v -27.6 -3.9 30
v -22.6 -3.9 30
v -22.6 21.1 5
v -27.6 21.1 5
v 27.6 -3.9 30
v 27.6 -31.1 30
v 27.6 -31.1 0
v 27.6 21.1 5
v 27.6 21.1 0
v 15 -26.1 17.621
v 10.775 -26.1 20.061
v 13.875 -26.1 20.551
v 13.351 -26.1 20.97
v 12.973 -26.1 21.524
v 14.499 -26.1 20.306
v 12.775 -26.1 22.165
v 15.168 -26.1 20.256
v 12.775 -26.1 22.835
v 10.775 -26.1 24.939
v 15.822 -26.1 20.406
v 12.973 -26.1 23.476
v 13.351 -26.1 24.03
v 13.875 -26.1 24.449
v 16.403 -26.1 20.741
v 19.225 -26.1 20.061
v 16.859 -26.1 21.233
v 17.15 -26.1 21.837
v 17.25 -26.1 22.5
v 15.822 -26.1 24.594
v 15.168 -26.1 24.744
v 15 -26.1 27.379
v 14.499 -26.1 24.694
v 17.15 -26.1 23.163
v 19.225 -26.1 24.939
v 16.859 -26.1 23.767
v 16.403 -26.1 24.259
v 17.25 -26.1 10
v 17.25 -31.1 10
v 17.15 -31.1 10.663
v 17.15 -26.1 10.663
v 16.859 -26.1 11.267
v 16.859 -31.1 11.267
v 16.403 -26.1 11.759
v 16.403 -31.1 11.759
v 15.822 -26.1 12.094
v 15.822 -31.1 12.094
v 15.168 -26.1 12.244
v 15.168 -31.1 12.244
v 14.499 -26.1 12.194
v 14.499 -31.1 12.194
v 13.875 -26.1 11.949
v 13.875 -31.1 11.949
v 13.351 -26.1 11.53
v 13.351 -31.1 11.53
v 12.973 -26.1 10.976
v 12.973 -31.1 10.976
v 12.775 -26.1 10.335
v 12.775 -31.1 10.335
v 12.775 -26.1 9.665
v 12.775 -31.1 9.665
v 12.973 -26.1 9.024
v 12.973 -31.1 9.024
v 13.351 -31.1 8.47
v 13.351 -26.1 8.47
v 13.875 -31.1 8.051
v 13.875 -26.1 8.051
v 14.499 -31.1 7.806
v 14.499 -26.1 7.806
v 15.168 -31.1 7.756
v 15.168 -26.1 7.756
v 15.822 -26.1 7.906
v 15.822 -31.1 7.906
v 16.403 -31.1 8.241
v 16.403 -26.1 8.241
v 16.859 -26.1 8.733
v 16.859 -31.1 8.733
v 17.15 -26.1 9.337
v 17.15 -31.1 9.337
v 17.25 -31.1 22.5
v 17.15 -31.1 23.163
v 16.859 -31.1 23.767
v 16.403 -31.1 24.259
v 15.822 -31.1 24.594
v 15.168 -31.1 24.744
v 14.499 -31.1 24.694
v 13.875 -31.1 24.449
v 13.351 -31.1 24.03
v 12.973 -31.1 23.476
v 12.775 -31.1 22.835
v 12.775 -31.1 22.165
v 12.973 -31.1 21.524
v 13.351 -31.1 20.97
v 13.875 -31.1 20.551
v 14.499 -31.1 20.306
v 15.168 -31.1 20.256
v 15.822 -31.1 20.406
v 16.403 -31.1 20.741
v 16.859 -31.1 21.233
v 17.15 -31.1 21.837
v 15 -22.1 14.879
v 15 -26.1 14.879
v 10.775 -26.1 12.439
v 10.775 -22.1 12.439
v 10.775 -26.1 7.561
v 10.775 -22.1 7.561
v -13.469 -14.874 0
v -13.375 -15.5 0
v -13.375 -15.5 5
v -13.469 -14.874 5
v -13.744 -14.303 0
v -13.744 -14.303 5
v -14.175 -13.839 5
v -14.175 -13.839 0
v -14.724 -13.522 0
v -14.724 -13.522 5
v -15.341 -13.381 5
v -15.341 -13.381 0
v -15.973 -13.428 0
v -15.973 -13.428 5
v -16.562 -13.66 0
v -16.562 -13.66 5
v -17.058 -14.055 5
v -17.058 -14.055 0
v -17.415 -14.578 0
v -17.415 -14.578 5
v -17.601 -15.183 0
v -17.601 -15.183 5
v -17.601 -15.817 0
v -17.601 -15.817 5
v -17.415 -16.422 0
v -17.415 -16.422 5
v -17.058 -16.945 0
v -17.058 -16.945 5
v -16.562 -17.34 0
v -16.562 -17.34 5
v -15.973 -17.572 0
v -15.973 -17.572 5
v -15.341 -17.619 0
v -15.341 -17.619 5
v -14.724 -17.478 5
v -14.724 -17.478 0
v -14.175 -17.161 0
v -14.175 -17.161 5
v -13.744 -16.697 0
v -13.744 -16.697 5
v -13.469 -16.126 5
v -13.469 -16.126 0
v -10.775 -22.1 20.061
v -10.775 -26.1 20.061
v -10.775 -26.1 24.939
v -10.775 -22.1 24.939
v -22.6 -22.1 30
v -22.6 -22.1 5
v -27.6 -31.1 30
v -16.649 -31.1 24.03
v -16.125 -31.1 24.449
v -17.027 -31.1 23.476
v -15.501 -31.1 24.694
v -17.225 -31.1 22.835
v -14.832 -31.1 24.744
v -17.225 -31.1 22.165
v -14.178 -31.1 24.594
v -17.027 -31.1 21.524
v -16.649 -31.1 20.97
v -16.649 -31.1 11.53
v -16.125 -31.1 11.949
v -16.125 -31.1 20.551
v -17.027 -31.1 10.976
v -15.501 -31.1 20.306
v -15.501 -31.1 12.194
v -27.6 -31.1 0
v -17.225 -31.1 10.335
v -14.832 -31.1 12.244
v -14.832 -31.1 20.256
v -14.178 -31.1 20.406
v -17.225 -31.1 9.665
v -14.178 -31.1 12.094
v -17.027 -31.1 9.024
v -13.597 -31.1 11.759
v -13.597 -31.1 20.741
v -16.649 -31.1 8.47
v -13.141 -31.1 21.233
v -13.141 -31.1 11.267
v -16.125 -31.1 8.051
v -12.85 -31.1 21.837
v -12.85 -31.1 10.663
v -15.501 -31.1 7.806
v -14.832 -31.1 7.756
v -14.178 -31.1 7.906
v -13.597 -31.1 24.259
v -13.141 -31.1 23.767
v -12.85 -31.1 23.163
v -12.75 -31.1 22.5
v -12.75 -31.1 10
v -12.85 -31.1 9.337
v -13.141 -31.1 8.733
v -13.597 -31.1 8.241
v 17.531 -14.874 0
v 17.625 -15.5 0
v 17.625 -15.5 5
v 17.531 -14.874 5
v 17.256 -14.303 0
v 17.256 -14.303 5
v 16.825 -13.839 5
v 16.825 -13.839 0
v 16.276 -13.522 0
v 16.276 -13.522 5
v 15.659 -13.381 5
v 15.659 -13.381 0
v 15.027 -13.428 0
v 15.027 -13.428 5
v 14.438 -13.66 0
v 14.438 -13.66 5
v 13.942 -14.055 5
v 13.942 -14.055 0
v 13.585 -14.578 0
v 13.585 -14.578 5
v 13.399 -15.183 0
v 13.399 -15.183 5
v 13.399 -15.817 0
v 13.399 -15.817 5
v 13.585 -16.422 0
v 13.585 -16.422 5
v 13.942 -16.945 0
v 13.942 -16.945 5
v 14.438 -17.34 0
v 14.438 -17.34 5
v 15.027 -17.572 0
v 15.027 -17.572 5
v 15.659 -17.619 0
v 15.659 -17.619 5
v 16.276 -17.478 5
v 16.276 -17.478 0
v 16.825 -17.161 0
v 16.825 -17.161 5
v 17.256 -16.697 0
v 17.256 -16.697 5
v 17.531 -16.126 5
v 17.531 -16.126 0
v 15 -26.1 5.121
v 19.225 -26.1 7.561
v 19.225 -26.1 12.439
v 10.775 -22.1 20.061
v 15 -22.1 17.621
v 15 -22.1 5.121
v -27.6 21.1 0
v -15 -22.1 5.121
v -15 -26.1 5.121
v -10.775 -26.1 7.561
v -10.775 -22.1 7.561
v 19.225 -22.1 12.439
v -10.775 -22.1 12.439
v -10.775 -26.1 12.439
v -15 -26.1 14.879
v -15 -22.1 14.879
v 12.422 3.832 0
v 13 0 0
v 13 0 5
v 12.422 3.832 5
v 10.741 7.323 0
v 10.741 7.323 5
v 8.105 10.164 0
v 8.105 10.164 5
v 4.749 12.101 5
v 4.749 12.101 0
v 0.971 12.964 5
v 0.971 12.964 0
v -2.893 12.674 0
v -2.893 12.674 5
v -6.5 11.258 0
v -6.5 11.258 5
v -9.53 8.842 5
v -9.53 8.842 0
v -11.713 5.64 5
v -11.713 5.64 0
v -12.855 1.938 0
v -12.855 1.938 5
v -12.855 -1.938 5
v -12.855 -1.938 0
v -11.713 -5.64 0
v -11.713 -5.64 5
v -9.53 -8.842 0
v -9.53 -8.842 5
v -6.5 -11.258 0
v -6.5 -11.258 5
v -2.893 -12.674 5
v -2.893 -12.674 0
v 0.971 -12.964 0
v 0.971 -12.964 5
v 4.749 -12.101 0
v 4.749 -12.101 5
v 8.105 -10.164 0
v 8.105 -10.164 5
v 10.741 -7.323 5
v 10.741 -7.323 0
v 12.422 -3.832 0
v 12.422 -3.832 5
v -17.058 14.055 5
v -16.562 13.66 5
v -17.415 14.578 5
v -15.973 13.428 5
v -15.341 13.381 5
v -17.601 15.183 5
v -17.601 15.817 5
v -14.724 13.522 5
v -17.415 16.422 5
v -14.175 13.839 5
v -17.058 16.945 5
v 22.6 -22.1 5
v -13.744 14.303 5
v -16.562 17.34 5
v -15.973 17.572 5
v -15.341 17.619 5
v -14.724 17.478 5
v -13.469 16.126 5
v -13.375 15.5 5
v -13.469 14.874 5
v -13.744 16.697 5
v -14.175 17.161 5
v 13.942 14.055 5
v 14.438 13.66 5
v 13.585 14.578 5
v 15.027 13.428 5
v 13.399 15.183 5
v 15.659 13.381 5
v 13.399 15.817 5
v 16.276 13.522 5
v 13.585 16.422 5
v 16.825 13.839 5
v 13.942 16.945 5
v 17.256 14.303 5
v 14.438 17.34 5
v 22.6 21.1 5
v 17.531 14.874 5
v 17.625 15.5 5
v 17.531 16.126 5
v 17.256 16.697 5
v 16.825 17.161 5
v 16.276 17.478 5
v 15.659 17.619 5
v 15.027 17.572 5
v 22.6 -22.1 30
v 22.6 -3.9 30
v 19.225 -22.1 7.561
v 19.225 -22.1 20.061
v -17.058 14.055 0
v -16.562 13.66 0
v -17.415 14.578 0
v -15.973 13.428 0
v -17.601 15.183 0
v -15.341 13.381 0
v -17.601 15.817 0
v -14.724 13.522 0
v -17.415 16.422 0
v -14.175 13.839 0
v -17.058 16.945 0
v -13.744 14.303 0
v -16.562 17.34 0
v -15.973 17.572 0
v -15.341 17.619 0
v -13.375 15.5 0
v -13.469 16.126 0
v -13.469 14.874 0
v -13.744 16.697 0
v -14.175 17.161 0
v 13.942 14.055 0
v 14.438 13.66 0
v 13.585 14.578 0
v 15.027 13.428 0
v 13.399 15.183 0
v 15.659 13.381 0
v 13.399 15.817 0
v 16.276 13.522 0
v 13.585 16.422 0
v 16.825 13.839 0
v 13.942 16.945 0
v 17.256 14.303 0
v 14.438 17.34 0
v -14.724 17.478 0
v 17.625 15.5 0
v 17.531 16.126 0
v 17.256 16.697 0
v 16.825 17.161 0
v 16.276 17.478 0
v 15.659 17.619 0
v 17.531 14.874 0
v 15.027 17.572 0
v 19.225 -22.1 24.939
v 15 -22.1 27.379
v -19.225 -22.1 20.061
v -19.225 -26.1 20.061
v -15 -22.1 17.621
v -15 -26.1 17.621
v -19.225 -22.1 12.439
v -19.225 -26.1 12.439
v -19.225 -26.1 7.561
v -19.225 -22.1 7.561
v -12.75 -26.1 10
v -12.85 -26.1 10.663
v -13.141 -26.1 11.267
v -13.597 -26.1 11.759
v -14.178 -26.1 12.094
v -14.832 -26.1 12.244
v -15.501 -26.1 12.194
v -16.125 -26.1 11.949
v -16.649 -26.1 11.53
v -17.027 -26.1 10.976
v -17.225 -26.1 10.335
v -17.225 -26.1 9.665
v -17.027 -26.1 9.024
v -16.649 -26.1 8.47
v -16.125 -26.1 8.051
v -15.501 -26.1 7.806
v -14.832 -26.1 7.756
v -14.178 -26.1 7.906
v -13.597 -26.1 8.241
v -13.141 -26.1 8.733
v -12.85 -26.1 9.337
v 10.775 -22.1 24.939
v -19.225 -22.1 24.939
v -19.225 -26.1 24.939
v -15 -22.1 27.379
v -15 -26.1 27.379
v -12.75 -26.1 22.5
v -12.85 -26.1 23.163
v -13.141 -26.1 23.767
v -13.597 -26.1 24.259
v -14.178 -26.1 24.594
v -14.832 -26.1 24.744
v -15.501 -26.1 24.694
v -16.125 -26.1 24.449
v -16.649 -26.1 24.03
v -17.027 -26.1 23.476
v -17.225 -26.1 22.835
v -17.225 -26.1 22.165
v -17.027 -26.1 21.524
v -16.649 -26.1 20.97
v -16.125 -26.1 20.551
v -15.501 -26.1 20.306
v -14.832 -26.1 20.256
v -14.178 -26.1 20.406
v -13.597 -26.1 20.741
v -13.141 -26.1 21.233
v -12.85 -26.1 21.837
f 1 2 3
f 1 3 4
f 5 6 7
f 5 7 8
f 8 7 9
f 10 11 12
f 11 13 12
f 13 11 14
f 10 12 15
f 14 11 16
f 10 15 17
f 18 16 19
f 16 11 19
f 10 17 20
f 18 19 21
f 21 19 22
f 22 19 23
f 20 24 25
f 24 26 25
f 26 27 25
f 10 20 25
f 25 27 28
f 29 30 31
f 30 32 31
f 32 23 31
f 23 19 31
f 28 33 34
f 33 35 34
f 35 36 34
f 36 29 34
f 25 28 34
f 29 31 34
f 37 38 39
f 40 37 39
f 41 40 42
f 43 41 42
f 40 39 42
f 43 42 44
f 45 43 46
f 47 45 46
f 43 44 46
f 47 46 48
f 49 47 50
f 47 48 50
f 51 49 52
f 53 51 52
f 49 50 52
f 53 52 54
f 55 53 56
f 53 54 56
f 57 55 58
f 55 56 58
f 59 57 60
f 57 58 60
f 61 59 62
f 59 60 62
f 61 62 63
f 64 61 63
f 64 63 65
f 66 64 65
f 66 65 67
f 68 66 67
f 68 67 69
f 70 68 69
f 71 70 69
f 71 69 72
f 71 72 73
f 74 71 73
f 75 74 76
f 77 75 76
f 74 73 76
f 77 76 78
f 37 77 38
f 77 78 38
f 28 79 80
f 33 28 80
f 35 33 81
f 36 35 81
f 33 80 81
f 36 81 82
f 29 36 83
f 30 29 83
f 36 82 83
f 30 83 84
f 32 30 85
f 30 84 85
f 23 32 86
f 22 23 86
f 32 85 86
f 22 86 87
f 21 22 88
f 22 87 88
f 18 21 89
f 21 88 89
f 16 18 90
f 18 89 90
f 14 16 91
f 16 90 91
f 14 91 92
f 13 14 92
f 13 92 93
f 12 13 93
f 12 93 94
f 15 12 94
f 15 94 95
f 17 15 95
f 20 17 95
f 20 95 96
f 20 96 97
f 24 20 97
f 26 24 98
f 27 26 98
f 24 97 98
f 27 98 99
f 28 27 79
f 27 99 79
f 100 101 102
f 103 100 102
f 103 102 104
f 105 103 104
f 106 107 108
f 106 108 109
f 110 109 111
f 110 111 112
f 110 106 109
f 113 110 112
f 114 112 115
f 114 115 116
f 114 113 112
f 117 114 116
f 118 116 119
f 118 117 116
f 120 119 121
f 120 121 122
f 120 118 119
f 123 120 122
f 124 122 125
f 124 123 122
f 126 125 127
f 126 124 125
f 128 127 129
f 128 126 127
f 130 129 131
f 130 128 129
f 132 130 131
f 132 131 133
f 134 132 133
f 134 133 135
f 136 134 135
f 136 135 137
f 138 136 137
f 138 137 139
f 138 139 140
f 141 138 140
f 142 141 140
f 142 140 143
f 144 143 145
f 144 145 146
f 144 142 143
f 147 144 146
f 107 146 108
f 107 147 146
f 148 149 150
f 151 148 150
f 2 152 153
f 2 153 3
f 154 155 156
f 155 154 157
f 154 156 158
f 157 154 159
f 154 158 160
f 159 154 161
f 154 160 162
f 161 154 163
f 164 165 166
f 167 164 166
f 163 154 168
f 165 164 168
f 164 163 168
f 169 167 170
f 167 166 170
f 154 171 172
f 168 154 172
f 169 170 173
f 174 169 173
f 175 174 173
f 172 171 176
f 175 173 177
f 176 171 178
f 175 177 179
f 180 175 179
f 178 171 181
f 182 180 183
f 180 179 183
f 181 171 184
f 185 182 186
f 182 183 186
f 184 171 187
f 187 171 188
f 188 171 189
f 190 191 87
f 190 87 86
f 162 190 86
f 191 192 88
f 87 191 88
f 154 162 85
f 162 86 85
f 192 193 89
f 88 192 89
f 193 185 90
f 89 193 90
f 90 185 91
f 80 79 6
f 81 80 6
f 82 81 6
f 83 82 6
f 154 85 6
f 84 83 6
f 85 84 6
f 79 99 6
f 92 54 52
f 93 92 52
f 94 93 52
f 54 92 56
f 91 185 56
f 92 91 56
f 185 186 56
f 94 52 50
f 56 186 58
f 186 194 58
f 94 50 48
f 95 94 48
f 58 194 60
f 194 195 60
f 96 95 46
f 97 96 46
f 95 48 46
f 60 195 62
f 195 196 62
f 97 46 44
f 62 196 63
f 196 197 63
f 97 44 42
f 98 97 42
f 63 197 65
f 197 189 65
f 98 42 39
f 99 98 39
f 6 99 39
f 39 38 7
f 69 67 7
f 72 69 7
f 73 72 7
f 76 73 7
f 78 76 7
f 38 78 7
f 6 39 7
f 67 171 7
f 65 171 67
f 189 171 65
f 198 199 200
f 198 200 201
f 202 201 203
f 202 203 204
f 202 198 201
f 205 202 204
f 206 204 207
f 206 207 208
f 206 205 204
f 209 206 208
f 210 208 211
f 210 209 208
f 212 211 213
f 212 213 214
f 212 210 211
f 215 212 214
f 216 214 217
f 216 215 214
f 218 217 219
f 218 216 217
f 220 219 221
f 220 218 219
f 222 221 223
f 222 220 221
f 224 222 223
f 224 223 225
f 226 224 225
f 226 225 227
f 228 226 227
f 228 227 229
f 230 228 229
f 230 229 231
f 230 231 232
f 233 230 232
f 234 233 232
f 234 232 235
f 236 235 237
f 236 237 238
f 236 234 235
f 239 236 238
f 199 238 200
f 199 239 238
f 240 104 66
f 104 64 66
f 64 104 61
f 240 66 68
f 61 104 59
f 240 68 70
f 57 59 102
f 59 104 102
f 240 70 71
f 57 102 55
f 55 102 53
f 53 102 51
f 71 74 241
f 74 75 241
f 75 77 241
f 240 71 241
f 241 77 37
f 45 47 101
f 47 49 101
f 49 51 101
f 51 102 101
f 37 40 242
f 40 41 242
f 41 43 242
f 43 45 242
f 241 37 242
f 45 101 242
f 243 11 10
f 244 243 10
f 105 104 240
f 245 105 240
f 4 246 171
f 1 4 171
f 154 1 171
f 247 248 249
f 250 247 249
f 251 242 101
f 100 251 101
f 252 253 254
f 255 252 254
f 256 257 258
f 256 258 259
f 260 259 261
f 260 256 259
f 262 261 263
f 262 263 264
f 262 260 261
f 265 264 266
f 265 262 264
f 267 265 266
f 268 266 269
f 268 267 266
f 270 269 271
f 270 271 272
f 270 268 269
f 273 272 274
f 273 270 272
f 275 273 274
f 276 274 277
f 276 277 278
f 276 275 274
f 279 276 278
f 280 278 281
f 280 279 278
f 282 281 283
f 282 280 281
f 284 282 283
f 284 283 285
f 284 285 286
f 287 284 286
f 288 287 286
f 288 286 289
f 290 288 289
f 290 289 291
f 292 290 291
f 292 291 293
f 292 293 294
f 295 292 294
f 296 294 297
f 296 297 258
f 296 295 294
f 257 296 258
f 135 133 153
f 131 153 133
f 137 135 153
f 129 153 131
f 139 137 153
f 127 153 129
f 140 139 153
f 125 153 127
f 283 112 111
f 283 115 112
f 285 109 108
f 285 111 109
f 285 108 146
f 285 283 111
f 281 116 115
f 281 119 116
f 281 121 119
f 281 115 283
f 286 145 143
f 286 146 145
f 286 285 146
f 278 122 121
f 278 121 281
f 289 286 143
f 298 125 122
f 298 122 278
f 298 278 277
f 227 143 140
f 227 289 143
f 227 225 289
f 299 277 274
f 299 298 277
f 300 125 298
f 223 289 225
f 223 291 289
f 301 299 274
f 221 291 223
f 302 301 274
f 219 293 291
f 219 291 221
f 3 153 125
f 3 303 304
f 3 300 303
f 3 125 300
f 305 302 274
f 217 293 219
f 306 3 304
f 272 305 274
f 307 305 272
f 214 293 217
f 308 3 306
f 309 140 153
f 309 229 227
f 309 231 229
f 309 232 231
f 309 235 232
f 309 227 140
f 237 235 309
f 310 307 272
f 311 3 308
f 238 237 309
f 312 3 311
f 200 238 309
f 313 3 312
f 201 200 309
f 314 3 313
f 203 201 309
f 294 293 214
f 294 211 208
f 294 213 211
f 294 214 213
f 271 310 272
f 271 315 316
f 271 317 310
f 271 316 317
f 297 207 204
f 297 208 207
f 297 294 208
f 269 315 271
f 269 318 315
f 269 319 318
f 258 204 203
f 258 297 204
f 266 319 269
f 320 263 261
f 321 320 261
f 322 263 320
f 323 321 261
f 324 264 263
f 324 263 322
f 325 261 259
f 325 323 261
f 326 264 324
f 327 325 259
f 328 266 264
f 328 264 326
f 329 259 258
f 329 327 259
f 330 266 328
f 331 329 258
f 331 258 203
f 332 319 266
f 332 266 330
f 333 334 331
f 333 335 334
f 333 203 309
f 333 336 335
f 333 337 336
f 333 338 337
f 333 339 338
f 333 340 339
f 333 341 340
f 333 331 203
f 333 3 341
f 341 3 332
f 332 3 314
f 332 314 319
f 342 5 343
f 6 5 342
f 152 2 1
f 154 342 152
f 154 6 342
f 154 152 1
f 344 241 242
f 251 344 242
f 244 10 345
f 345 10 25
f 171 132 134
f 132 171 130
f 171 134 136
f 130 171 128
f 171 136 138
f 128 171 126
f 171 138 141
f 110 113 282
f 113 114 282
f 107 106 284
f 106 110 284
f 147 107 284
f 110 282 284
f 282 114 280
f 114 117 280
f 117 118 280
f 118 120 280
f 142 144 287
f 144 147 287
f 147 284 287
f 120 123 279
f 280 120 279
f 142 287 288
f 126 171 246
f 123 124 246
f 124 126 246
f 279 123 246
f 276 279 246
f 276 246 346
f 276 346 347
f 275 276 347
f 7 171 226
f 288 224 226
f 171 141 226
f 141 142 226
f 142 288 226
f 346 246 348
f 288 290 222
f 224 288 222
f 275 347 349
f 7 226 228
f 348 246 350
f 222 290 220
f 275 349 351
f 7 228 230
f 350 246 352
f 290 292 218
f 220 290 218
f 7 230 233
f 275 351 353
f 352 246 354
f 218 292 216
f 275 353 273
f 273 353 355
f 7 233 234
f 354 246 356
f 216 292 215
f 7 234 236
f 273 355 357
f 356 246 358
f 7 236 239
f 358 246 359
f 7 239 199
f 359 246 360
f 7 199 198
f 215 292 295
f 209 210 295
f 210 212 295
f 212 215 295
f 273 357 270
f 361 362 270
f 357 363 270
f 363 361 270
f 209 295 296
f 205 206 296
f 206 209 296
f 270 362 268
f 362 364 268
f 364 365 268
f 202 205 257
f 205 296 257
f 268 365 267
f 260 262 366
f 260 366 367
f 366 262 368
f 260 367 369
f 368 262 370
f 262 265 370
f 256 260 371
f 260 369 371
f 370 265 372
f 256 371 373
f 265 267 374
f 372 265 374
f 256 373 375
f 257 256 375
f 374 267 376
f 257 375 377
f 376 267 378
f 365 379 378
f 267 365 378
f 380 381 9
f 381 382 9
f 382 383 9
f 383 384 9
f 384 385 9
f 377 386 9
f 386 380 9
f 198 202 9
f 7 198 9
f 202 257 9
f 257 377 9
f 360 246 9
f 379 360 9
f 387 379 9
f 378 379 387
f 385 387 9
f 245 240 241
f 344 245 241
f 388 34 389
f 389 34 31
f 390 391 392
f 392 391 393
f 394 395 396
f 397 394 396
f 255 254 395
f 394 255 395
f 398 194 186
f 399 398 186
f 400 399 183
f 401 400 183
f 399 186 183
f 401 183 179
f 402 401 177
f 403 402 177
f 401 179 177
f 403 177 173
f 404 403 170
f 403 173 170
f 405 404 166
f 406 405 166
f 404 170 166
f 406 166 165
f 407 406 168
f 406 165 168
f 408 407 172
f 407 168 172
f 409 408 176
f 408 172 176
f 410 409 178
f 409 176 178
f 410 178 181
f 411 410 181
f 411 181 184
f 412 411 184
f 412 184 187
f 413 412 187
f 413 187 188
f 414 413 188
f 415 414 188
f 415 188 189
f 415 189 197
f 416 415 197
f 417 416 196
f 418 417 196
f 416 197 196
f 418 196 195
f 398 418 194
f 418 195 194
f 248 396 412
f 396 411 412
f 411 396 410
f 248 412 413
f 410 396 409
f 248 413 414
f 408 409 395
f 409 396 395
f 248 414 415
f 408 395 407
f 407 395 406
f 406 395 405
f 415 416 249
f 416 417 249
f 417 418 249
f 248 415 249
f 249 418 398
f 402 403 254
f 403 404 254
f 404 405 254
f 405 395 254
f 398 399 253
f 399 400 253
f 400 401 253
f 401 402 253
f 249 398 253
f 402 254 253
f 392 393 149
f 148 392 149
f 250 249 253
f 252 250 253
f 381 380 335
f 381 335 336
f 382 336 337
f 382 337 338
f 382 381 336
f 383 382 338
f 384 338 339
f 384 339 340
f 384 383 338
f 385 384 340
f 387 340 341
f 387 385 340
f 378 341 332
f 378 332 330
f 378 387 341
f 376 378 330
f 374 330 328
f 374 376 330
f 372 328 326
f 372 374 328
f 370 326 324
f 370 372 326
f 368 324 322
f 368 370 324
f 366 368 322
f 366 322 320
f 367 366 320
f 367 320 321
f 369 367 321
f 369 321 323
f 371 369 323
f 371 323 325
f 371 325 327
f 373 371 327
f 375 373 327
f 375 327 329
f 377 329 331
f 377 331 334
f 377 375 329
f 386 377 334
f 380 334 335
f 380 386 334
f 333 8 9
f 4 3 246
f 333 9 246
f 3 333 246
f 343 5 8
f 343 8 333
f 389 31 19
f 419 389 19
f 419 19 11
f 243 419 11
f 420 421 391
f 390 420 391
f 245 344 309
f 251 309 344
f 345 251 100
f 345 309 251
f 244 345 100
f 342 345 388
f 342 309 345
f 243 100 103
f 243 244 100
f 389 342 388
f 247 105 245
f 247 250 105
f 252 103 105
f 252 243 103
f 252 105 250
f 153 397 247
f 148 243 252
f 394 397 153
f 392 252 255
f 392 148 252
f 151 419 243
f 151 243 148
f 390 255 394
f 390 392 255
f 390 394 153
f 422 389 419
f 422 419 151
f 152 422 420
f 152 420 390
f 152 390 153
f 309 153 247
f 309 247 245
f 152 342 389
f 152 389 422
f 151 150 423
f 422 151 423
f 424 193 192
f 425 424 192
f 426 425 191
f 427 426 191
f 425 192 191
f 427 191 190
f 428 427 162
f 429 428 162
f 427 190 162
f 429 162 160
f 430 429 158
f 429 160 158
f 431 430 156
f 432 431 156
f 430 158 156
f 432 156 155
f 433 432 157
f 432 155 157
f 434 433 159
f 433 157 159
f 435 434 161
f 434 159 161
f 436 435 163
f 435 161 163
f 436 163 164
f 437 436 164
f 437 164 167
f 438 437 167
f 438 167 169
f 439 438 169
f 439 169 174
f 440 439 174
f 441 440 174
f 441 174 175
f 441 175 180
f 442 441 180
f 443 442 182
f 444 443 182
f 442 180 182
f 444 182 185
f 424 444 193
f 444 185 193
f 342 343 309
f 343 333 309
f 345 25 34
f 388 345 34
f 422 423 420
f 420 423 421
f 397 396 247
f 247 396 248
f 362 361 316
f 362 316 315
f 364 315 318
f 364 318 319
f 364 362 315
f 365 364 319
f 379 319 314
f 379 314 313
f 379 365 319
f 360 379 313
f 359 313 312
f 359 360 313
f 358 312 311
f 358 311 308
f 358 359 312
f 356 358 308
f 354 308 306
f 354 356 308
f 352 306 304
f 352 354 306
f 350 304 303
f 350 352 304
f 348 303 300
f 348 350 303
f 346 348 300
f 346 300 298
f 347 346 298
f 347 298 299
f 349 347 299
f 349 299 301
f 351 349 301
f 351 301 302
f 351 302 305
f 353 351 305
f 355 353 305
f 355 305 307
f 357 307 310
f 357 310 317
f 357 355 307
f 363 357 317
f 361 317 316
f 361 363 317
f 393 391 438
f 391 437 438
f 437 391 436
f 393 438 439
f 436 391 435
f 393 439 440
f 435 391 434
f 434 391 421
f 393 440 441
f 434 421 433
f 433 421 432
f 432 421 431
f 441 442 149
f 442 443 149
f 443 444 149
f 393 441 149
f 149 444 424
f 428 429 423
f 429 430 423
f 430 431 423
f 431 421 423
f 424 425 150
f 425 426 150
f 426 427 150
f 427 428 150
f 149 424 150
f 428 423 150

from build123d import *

# Parameters (mm, degrees)
F0_R     = 2.125
F0_R_2   = 13
F1_DEPTH = 5
F3_DEPTH = 25
F4_W     = 55.2
F4_H     = 30
F4_R     = 2.25
F5_DEPTH = 5
F6_W     = 45.2
F6_H     = 25
F7_DEPTH = 4
F8_SIZE  = 25


with BuildPart() as f1:
    # F0 (on Top) → F1 (new body)
    with BuildSketch(Plane.XY):
        Polygon((27.6, -21.1), (27.6, 21.1), (-27.6, 21.1), (-27.6, -21.1), (-27.6, -31.1), (0, -31.1), (27.6, -31.1), align=None)
        with Locations((-15.5, -15.5)):
            Circle(F0_R, mode=Mode.SUBTRACT)
        with Locations((15.5, -15.5)):
            Circle(F0_R, mode=Mode.SUBTRACT)
        with Locations((-15.5, 15.5)):
            Circle(F0_R, mode=Mode.SUBTRACT)
        Circle(F0_R_2, mode=Mode.SUBTRACT)
        with Locations((15.5, 15.5)):
            Circle(F0_R, mode=Mode.SUBTRACT)
    extrude(amount=F1_DEPTH)

    # F2 (on face) → F3 (join)
    with BuildSketch(Plane.XY.offset(5)):
        Polygon((-22.6, -21.1), (-22.6, 21.1), (-27.6, 21.1), (-27.6, -21.1), (-27.6, -31.1), (-22.6, -31.1), align=None)
        Polygon((27.6, 21.1), (22.6, 21.1), (22.6, -21.1), (22.6, -31.1), (27.6, -31.1), (27.6, -21.1), align=None)
    extrude(amount=F3_DEPTH)

    # F4 (on face) → F5 (join)
    with BuildSketch(Plane.XZ.offset(31.1)):
        with Locations((0, 15)):
            Rectangle(F4_W, F4_H)
        with Locations((-15, 10)):
            Circle(F4_R, mode=Mode.SUBTRACT)
        with Locations((15, 10)):
            Circle(F4_R, mode=Mode.SUBTRACT)
        with Locations((-15, 22.5)):
            Circle(F4_R, mode=Mode.SUBTRACT)
        with Locations((15, 22.5)):
            Circle(F4_R, mode=Mode.SUBTRACT)
    extrude(amount=-F5_DEPTH)

    # F6 (on face) → F7 (join)
    with BuildSketch(Plane(origin=(0, -26.1, 0), x_dir=(-1, 0, 0), z_dir=(0, 1, 0))):
        with Locations((0, 17.5)):
            Rectangle(F6_W, F6_H)
        Polygon((-15, 14.87861), (-10.775, 12.439305), (-10.775, 7.560695), (-15, 5.12139), (-19.225, 7.560695), (-19.225, 12.439305), align=None, mode=Mode.SUBTRACT)
        Polygon((10.775, 7.560695), (10.775, 12.439305), (15, 14.87861), (19.225, 12.439305), (19.225, 7.560695), (15, 5.12139), align=None, mode=Mode.SUBTRACT)
        Polygon((-15, 27.37861), (-10.775, 24.939305), (-10.775, 20.060695), (-15, 17.62139), (-19.225, 20.060695), (-19.225, 24.939305), align=None, mode=Mode.SUBTRACT)
        Polygon((10.775, 24.939305), (15, 27.37861), (19.225, 24.939305), (19.225, 20.060695), (15, 17.62139), (10.775, 20.060695), align=None, mode=Mode.SUBTRACT)
    extrude(amount=F7_DEPTH)

    # F8
    f8_edges = [f1.edges().sort_by_distance(p)[0] for p in [
        (-25.1, 21.1, 30),
        (25.1, 21.1, 30),
    ]]
    chamfer(f8_edges, length=F8_SIZE)


solid = f1.part
